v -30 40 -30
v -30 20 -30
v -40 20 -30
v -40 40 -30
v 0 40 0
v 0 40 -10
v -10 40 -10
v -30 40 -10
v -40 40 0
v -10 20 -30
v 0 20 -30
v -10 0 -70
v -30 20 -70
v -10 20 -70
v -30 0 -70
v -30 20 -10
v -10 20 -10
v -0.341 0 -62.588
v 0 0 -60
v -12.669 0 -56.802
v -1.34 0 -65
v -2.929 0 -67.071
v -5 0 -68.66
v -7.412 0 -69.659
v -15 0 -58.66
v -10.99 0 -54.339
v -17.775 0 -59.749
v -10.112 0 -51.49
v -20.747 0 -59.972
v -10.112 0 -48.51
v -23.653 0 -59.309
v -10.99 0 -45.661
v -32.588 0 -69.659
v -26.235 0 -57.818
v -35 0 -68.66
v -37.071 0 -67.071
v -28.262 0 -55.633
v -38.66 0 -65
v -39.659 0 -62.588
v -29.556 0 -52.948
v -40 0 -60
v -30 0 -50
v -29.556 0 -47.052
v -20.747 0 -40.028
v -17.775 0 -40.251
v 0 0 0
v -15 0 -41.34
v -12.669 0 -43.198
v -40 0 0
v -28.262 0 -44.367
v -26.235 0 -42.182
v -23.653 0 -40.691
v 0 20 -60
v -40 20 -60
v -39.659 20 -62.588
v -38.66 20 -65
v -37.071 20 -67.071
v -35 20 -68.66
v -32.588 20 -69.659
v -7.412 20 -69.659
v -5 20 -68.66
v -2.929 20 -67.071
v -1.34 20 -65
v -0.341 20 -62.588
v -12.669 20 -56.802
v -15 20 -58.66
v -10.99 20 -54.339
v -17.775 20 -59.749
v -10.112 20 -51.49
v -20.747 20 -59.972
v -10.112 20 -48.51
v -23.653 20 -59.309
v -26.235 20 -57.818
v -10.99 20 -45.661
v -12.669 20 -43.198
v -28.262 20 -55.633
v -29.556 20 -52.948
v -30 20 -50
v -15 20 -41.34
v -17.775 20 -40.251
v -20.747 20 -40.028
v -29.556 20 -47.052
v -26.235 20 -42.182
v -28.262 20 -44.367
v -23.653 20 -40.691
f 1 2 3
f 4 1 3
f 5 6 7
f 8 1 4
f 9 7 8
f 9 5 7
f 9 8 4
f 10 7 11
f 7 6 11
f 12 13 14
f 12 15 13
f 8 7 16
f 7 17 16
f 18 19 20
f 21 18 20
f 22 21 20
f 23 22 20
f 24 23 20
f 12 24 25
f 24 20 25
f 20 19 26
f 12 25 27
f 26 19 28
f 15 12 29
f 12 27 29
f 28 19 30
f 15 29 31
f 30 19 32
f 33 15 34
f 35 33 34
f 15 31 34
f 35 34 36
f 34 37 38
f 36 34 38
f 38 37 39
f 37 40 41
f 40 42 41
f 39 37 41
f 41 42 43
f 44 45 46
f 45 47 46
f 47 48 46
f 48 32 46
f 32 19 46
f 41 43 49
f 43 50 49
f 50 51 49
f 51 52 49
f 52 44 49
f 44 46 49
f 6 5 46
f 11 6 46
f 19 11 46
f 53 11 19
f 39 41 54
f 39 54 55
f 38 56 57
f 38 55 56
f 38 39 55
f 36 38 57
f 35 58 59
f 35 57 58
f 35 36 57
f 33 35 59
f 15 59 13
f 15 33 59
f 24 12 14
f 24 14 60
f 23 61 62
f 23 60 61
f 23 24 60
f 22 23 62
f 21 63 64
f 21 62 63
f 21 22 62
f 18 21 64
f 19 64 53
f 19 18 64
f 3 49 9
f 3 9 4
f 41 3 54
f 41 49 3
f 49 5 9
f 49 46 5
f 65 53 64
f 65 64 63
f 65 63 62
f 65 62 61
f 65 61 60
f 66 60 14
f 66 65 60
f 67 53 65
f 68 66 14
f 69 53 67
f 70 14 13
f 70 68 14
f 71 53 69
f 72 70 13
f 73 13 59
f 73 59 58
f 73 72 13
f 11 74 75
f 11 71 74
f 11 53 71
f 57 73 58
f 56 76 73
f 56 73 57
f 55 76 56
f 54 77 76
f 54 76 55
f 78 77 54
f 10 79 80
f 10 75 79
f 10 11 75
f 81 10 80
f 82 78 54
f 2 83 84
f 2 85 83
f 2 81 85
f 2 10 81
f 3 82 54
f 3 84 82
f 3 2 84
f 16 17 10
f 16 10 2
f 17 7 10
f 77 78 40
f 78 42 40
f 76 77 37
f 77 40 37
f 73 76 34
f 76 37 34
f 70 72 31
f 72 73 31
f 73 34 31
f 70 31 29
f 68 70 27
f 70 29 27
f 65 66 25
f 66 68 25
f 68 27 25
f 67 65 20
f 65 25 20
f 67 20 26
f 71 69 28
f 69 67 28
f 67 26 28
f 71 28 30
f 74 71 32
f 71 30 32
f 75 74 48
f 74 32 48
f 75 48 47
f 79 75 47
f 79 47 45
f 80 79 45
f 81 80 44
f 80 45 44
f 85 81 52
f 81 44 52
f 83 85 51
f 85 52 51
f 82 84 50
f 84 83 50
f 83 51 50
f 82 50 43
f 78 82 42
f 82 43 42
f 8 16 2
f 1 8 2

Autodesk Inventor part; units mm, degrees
ref_plane "YZ Plane" through (0, 0, 0) normal (1, 0, 0) x (0, 1, 0)
ref_plane "XZ Plane" through (0, 0, 0) normal (0, 1, 0) x (-1, 0, 0)
ref_plane "XY Plane" through (0, 0, 0) normal (0, 0, 1) x (1, 0, 0)
sketch "草圖1" plane through (0, 0, 0) normal (0, 1, 0) x (-1, 0, 0)
  line L0 (0, 0) -> (40, 0)
  line L1 (40, 0) -> (40, -60)
  line L2 (30, -70) -> (10, -70)
  line L3 (0, -60) -> (0, 0)
  circle A0 centre (20, -50) radius 10
  arc A1 (30, -70) -> (40, -60) centre (30, -60) ccw
  arc A2 (0, -60) -> (10, -70) centre (10, -60) ccw
  line L4 (0, -10) -> (30, -10)
  line L5 (30, -10) -> (30, -30)
  line L6 (30, -30) -> (40, -30)
  point P0 (40, -70)
  point P1 (0, -70)
  point P2 (40, -10)
  point P3 (0, -30)
  dimension "d0" = 40
  dimension "d1" = 70
  dimension "d5" = 20
  dimension "d6" = 20
  dimension "d7" = 20
  dimension "d8" = 10
  dimension "d18" = 30
  dimension "d19" = 20
  dimension "d20" = 10
extrude "擠出1" add sketch "草圖1" along normal blind 40 contours L0 L1 L6 L5 L4 L3
extrude "擠出2" add sketch "草圖1" along normal blind 20
sketch "草圖3" plane through (0, 0, 0) normal (1, 0, 0) x (0, 0, -1)
  line L0 (10, 40) -> (30, 20)
  line L1 (10, 20) -> (10, 40) projected
  line L2 (30, 20) -> (10, 20)
  line L3 (10, 20) -> (10, 40)
  point P0 (0, 0)
extrude "擠出4" add sketch "草圖3" against normal blind 10
